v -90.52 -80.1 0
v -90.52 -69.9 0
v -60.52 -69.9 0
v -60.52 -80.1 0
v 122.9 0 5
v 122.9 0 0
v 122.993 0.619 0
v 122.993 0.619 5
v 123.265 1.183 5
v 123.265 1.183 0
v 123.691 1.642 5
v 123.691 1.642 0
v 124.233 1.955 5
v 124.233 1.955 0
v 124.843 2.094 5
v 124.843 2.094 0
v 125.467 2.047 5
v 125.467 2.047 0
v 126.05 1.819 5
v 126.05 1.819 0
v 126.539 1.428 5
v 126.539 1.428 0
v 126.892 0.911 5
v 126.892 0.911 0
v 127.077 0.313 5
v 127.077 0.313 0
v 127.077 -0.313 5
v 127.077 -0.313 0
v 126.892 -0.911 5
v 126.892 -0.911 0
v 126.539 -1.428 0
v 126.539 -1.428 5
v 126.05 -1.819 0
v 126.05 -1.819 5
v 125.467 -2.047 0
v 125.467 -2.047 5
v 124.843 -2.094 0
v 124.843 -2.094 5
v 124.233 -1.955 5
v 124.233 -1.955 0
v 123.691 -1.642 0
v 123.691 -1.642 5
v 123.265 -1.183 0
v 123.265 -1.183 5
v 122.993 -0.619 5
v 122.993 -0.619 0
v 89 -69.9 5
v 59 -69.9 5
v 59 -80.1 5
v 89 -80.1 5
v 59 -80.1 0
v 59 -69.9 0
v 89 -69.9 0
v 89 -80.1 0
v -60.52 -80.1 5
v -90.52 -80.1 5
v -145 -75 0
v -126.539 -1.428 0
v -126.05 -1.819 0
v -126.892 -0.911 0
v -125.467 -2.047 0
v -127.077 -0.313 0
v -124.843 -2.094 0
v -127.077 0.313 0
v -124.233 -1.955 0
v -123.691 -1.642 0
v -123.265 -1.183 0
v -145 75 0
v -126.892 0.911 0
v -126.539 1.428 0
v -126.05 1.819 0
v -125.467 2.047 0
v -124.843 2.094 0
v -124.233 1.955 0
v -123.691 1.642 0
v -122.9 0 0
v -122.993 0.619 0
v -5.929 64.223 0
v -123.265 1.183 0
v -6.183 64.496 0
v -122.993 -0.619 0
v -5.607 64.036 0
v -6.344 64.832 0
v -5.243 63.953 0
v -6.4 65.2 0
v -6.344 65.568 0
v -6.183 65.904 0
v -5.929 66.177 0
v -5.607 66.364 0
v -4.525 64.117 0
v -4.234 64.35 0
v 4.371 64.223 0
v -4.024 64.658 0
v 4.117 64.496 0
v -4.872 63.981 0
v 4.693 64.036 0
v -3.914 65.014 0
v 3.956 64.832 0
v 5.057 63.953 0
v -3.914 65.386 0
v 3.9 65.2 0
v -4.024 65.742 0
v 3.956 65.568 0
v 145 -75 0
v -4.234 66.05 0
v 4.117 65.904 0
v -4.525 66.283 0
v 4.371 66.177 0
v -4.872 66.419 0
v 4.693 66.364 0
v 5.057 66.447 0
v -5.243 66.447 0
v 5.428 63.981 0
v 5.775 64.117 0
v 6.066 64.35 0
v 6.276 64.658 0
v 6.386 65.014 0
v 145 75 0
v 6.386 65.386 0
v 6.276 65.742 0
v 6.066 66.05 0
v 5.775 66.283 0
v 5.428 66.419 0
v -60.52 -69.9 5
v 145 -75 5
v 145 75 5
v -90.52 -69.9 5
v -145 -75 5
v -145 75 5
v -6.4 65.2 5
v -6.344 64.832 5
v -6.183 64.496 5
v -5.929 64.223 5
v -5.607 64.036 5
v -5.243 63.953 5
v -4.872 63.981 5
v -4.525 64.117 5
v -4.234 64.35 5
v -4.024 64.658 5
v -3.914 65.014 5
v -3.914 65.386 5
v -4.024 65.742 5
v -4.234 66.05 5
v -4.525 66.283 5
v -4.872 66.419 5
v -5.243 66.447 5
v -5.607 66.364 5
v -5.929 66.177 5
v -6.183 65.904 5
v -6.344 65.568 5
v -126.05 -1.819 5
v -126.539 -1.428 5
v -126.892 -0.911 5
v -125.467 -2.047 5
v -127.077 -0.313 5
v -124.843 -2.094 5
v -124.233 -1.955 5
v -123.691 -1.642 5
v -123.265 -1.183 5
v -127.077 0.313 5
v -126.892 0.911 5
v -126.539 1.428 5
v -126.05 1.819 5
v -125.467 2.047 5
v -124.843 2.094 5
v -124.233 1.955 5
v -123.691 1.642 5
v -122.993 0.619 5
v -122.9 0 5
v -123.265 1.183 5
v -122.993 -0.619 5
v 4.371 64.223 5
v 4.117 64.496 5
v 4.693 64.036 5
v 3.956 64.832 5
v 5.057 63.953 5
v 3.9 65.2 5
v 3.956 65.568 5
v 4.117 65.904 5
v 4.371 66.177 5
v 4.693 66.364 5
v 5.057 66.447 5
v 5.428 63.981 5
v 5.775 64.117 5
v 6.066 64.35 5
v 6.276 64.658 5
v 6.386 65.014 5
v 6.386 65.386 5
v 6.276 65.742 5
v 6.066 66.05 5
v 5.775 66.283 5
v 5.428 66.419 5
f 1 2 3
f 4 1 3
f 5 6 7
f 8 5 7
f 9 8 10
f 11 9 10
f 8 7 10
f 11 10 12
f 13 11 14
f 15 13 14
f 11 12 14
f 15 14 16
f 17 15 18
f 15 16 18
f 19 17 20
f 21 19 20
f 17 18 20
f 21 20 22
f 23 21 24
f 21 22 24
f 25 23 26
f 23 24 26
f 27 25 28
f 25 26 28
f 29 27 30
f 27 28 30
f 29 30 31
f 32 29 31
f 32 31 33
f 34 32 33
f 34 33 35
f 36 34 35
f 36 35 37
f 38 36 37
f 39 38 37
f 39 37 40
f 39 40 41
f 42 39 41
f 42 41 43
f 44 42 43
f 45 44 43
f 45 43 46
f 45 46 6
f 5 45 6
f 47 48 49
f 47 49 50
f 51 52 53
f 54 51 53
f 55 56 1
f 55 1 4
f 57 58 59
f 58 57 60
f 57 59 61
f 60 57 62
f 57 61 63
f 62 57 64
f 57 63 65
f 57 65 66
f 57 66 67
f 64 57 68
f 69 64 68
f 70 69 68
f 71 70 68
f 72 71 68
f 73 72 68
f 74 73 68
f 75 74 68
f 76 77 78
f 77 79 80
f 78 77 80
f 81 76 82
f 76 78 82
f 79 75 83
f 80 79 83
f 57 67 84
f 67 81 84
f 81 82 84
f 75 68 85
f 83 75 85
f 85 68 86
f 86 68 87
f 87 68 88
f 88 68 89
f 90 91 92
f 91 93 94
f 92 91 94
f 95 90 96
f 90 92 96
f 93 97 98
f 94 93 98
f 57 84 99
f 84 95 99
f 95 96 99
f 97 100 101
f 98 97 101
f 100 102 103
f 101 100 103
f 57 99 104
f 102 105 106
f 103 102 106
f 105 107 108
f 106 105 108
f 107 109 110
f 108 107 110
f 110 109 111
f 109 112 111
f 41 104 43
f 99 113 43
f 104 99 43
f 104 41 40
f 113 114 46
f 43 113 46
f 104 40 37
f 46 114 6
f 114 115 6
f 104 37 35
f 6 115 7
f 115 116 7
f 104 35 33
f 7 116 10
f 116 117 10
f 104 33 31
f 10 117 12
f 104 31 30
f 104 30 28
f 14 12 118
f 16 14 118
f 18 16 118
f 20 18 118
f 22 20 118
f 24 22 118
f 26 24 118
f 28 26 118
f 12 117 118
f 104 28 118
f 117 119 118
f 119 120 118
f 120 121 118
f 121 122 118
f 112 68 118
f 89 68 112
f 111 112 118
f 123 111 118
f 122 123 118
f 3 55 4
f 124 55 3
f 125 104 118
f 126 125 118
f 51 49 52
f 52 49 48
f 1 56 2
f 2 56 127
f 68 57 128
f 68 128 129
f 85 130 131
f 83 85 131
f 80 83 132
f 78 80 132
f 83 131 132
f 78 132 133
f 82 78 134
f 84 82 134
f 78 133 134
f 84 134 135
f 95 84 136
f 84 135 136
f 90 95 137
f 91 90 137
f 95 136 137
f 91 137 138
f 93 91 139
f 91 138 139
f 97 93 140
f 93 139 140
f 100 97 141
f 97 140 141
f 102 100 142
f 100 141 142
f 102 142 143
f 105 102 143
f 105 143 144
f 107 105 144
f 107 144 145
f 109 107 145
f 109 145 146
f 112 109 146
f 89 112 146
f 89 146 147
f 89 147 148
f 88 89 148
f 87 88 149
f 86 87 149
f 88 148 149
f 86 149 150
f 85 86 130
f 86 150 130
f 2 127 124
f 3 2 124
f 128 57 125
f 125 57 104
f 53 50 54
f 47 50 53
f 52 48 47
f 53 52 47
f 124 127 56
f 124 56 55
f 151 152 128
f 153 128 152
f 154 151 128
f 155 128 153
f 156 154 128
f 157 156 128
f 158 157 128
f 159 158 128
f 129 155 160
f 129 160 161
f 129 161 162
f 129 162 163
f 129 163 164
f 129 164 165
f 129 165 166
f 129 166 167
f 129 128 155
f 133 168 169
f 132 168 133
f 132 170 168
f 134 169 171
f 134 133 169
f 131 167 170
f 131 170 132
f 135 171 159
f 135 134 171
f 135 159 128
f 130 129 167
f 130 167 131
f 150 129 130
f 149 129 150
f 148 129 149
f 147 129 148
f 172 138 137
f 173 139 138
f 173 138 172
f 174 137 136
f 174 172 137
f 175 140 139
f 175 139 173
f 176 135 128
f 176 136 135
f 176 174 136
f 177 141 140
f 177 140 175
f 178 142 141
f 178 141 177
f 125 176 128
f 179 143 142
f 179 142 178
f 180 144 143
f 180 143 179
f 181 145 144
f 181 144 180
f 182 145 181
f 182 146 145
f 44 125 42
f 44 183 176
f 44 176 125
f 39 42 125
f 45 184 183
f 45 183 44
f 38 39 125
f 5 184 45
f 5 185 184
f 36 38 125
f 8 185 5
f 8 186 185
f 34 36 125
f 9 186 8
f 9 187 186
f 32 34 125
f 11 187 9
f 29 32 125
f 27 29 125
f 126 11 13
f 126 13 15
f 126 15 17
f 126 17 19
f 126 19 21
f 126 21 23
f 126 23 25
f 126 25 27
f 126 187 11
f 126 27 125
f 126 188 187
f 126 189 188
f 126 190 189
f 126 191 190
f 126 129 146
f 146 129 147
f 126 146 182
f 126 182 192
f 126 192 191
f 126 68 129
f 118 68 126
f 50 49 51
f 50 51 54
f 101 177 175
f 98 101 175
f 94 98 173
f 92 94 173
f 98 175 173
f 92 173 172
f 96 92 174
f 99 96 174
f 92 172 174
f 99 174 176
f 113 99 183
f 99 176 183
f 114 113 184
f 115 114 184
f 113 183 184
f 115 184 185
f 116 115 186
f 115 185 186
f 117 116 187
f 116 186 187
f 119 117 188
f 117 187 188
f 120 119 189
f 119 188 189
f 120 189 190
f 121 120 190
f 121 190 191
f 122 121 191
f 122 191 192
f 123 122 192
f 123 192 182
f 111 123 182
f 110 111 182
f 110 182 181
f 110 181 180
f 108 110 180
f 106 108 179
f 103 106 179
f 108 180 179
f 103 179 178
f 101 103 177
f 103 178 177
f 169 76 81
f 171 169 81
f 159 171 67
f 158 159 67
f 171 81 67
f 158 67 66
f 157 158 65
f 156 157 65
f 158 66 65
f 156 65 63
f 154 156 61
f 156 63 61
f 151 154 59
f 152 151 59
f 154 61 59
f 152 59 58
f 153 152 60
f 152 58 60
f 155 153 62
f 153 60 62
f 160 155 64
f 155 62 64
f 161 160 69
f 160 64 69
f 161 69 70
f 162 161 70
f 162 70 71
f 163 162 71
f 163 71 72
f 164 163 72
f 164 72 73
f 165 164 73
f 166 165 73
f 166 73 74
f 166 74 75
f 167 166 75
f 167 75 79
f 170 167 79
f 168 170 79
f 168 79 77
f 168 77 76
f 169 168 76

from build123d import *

# Parameters (mm, degrees)
SKETCH1_W             = 290
SKETCH1_H             = 150
BOSS_EXTRUDE1_DEPTH   = 5
CUT_EXTRUDE1_DEPTH    = 5
SKETCH3_W             = 30
SKETCH3_H             = 10.2
BOSS_EXTRUDE2_DEPTH   = 5
BOSS_EXTRUDE2_2_DEPTH = 5
SKETCH4_R             = 2.1
CUT_EXTRUDE2_DEPTH    = 10


with BuildPart() as part:
    # Sketch1 → Boss-Extrude1 (new body)
    with BuildSketch(Plane.XY):
        Rectangle(SKETCH1_W, SKETCH1_H)
    extrude(amount=BOSS_EXTRUDE1_DEPTH)

    # Sketch2 → Cut-Extrude1 (cut)
    with BuildSketch(Plane.XY.offset(5)):
        with BuildLine():
            Line((-6.4, 65.2), (-5.15, 65.2))
            Line((-5.15, 65.2), (-3.9, 65.2))
            ThreePointArc((-3.9, 65.2), (-5.15, 66.45), (-6.4, 65.2))
        make_face()
        with BuildLine():
            Line((-3.9, 65.2), (-5.15, 65.2))
            Line((-5.15, 65.2), (-6.4, 65.2))
            ThreePointArc((-6.4, 65.2), (-5.15, 63.95), (-3.9, 65.2))
        make_face()
        with BuildLine():
            ThreePointArc((6.4, 65.2), (5.15, 66.45), (3.9, 65.2))
            Line((3.9, 65.2), (5.15, 65.2))
            Line((5.15, 65.2), (6.4, 65.2))
        make_face()
        with BuildLine():
            Line((5.15, 65.2), (3.9, 65.2))
            ThreePointArc((3.9, 65.2), (5.15, 63.95), (6.4, 65.2))
            Line((6.4, 65.2), (5.15, 65.2))
        make_face()
    extrude(amount=-CUT_EXTRUDE1_DEPTH, mode=Mode.SUBTRACT)

    # Sketch4 → Cut-Extrude2 (cut)
    with BuildSketch(Plane(origin=(0, 0, 0), x_dir=(-1, 0, 0), z_dir=(0, 0, -1))):
        with Locations((-125, 0)):
            Circle(SKETCH4_R)
        with Locations(Location((125, 0, 0), (0, 0, 180))):
            Circle(SKETCH4_R)
    extrude(amount=-CUT_EXTRUDE2_DEPTH, mode=Mode.SUBTRACT)


with BuildPart() as body_2:
    # Sketch3 → Boss-Extrude2 (new body)
    with BuildSketch(Plane.XY.offset(5)):
        with Locations((-75.52, -75)):
            Rectangle(SKETCH3_W, SKETCH3_H)
    extrude(amount=-BOSS_EXTRUDE2_DEPTH)


with BuildPart() as body_3:
    # Sketch3 → Boss-Extrude2 2 (new body)
    with BuildSketch(Plane.XY.offset(5)):
        with Locations((74, -75)):
            Rectangle(SKETCH3_W, SKETCH3_H)
    extrude(amount=-BOSS_EXTRUDE2_2_DEPTH)


solid = Compound([part.part, body_2.part, body_3.part])
